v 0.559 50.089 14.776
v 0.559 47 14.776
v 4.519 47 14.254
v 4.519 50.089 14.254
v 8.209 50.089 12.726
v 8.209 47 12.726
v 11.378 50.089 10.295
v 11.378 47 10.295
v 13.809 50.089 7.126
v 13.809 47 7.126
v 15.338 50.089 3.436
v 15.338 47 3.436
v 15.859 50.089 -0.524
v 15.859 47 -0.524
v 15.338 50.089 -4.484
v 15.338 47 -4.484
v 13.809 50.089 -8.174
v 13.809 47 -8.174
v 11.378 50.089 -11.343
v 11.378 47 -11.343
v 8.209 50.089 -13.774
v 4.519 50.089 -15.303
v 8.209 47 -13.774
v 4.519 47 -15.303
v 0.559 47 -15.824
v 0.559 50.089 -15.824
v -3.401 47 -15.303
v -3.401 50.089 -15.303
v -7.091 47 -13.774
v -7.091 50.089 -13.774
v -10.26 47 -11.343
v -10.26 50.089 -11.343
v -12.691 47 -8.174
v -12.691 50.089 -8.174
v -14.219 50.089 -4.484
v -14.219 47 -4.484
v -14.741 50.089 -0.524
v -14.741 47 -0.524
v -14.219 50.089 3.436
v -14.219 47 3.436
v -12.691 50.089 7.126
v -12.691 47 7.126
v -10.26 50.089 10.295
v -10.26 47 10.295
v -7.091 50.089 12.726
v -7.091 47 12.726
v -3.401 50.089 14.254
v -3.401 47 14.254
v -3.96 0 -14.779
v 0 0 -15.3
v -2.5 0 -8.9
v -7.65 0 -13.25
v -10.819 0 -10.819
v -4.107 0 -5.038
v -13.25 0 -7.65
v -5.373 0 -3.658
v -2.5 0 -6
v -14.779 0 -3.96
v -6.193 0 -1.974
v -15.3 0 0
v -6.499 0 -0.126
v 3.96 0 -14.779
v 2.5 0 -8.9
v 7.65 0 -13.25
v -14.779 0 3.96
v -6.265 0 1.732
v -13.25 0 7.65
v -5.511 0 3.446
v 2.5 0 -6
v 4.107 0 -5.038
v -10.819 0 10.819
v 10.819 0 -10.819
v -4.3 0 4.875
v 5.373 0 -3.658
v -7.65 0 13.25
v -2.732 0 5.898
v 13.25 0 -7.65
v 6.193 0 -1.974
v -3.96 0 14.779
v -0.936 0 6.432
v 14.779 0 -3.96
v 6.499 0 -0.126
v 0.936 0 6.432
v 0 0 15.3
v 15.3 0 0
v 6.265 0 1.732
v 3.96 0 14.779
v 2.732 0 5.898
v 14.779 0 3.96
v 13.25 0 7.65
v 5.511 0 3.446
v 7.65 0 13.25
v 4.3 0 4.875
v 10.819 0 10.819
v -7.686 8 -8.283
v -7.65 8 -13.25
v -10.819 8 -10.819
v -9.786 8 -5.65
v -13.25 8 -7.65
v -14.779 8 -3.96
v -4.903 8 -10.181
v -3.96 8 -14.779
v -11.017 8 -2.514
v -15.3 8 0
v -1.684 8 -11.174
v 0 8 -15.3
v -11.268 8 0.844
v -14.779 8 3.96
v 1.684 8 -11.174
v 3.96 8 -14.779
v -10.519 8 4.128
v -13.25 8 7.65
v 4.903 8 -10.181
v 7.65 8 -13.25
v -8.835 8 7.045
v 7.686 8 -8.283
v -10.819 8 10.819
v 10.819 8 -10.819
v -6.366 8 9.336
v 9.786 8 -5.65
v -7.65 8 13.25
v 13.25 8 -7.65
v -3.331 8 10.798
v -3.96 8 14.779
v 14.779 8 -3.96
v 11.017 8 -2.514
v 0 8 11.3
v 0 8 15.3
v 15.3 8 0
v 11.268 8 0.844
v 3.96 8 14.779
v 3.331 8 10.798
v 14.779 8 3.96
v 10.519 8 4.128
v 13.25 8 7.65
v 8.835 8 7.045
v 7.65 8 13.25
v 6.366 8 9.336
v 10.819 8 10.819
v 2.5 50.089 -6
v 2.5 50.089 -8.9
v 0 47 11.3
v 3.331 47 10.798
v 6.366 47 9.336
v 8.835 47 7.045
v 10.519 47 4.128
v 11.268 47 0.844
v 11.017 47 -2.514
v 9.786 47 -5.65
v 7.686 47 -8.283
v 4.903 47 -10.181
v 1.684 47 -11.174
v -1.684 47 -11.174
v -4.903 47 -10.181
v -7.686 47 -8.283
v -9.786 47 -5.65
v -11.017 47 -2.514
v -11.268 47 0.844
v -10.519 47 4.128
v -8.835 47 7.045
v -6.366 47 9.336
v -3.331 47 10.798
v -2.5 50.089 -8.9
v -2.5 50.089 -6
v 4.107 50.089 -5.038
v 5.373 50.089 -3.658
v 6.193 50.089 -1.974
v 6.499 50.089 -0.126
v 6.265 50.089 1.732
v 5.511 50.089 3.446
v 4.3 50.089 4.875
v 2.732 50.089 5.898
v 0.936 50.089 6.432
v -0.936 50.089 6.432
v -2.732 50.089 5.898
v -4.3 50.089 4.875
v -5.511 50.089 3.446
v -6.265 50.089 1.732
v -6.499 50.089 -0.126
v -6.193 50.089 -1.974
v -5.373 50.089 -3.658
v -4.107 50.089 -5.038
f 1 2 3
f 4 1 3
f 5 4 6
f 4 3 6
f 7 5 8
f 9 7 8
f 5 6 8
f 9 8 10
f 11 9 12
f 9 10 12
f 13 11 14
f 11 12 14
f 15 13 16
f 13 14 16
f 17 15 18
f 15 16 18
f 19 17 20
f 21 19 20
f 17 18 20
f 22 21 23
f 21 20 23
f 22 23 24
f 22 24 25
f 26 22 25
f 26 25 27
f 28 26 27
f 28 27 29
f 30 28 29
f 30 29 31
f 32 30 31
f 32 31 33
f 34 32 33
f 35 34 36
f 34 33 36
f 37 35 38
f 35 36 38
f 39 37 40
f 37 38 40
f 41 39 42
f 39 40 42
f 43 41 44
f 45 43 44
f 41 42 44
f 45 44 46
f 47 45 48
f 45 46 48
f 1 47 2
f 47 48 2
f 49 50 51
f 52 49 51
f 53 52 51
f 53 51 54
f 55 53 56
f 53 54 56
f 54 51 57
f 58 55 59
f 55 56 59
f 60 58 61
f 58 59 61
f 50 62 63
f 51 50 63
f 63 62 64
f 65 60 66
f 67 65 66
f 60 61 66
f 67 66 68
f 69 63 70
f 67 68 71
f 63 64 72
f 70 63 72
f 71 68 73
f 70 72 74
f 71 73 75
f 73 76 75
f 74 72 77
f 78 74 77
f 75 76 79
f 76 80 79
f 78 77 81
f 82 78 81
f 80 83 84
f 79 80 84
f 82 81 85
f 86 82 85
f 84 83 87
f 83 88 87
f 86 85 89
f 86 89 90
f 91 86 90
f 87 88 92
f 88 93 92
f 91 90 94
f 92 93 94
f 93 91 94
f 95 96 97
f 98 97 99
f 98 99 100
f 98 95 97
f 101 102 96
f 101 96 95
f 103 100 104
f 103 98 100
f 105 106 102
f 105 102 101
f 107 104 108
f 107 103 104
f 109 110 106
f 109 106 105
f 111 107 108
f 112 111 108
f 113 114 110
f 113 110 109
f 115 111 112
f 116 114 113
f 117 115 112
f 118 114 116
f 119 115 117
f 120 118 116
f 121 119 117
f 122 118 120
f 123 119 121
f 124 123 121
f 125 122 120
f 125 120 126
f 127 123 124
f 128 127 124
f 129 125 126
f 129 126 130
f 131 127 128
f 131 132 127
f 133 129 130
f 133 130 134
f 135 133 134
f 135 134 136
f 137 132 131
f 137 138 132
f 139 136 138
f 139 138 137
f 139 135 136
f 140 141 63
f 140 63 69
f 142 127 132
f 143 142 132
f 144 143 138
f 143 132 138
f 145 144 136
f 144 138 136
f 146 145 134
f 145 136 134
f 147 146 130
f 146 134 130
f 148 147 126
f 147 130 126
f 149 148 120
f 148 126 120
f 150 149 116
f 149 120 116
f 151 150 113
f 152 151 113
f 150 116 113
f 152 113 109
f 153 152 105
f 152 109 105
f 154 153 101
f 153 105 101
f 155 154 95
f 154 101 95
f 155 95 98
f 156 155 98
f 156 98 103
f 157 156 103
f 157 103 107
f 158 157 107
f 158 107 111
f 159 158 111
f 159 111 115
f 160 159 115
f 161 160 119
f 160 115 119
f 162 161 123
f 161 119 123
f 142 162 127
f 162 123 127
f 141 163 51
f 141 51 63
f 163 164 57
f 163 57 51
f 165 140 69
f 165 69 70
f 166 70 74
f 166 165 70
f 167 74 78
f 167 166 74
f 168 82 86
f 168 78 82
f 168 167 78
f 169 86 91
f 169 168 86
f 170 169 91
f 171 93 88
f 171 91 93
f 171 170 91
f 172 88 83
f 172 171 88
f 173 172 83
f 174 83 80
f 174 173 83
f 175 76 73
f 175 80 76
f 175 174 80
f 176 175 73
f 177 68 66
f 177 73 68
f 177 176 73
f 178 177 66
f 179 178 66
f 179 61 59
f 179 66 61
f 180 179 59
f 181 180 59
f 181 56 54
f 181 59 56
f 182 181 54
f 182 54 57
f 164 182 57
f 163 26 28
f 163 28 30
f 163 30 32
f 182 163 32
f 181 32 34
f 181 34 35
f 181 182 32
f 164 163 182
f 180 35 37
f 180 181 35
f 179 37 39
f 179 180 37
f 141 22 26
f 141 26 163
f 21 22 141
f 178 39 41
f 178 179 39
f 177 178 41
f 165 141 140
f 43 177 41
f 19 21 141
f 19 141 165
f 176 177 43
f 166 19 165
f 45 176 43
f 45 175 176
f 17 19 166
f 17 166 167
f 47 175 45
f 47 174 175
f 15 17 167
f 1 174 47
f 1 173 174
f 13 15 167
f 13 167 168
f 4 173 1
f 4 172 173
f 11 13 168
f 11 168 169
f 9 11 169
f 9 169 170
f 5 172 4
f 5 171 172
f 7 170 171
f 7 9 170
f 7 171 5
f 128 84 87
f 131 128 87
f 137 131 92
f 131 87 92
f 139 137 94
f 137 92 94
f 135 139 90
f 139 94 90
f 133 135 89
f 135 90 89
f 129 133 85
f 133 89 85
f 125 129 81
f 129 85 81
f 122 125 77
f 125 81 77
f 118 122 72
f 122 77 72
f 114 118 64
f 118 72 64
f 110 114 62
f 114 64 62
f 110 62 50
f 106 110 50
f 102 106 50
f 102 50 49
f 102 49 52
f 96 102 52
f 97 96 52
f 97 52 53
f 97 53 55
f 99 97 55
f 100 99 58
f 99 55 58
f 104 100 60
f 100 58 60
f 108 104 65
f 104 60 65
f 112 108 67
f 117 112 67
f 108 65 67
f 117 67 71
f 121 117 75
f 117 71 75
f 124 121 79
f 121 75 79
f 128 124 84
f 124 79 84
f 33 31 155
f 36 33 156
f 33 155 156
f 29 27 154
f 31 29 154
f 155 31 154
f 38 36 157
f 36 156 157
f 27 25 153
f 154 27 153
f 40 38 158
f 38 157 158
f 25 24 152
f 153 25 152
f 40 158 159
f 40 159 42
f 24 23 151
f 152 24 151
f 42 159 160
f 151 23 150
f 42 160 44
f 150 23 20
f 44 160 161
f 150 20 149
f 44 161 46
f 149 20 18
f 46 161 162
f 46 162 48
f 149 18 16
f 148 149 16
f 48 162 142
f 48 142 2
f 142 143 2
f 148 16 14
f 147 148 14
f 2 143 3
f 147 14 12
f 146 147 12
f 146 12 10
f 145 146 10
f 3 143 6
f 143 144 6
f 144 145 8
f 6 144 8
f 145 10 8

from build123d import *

# Parameters (mm, degrees)
SKETCH1_R           = 15.3
BOSS_EXTRUDE1_DEPTH = 8
SKETCH2_R           = 11.3
BOSS_EXTRUDE2_DEPTH = 39
SKETCH3_R           = 15.3
BOSS_EXTRUDE3_DEPTH = 3.088651712
CUT_EXTRUDE4_DEPTH  = 51


with BuildPart() as part:
    # Sketch1 → Boss-Extrude1 (new body)
    with BuildSketch(Plane(origin=(0, 0, 0), x_dir=(1, 0, 0), z_dir=(0, 1, 0))):
        with Locations(Location((0, 0, 0), (0, 0, 270))):
            Circle(SKETCH1_R)
    extrude(amount=BOSS_EXTRUDE1_DEPTH)

    # Sketch2 → Boss-Extrude2 (add)
    with BuildSketch(Plane(origin=(0, 8, 0), x_dir=(1, 0, 0), z_dir=(0, 1, 0))):
        with Locations(Location((0, 0, 0), (0, 0, 270))):
            Circle(SKETCH2_R)
    extrude(amount=BOSS_EXTRUDE2_DEPTH)

    # Sketch3 → Boss-Extrude3 (add)
    with BuildSketch(Plane(origin=(0, 47, 0), x_dir=(1, 0, 0), z_dir=(0, 1, 0))):
        with Locations(Location((0.559173948, 0.524225576, 0), (0, 0, 270))):
            Circle(SKETCH3_R)
    extrude(amount=BOSS_EXTRUDE3_DEPTH)

    # Sketch6 → Cut-Extrude4 (cut)
    with BuildSketch(Plane(origin=(0, 50.088651712, 0), x_dir=(1, 0, 0), z_dir=(0, 1, 0))):
        with BuildLine():
            Line((-2.5, 8.9), (2.5, 8.9))
            Line((2.5, 8.9), (2.5, 6))
            ThreePointArc((2.5, 6), (0, -6.5), (-2.5, 6))
            Line((-2.5, 6), (-2.5, 8.9))
        make_face()
    extrude(amount=-CUT_EXTRUDE4_DEPTH, mode=Mode.SUBTRACT)


solid = part.part
